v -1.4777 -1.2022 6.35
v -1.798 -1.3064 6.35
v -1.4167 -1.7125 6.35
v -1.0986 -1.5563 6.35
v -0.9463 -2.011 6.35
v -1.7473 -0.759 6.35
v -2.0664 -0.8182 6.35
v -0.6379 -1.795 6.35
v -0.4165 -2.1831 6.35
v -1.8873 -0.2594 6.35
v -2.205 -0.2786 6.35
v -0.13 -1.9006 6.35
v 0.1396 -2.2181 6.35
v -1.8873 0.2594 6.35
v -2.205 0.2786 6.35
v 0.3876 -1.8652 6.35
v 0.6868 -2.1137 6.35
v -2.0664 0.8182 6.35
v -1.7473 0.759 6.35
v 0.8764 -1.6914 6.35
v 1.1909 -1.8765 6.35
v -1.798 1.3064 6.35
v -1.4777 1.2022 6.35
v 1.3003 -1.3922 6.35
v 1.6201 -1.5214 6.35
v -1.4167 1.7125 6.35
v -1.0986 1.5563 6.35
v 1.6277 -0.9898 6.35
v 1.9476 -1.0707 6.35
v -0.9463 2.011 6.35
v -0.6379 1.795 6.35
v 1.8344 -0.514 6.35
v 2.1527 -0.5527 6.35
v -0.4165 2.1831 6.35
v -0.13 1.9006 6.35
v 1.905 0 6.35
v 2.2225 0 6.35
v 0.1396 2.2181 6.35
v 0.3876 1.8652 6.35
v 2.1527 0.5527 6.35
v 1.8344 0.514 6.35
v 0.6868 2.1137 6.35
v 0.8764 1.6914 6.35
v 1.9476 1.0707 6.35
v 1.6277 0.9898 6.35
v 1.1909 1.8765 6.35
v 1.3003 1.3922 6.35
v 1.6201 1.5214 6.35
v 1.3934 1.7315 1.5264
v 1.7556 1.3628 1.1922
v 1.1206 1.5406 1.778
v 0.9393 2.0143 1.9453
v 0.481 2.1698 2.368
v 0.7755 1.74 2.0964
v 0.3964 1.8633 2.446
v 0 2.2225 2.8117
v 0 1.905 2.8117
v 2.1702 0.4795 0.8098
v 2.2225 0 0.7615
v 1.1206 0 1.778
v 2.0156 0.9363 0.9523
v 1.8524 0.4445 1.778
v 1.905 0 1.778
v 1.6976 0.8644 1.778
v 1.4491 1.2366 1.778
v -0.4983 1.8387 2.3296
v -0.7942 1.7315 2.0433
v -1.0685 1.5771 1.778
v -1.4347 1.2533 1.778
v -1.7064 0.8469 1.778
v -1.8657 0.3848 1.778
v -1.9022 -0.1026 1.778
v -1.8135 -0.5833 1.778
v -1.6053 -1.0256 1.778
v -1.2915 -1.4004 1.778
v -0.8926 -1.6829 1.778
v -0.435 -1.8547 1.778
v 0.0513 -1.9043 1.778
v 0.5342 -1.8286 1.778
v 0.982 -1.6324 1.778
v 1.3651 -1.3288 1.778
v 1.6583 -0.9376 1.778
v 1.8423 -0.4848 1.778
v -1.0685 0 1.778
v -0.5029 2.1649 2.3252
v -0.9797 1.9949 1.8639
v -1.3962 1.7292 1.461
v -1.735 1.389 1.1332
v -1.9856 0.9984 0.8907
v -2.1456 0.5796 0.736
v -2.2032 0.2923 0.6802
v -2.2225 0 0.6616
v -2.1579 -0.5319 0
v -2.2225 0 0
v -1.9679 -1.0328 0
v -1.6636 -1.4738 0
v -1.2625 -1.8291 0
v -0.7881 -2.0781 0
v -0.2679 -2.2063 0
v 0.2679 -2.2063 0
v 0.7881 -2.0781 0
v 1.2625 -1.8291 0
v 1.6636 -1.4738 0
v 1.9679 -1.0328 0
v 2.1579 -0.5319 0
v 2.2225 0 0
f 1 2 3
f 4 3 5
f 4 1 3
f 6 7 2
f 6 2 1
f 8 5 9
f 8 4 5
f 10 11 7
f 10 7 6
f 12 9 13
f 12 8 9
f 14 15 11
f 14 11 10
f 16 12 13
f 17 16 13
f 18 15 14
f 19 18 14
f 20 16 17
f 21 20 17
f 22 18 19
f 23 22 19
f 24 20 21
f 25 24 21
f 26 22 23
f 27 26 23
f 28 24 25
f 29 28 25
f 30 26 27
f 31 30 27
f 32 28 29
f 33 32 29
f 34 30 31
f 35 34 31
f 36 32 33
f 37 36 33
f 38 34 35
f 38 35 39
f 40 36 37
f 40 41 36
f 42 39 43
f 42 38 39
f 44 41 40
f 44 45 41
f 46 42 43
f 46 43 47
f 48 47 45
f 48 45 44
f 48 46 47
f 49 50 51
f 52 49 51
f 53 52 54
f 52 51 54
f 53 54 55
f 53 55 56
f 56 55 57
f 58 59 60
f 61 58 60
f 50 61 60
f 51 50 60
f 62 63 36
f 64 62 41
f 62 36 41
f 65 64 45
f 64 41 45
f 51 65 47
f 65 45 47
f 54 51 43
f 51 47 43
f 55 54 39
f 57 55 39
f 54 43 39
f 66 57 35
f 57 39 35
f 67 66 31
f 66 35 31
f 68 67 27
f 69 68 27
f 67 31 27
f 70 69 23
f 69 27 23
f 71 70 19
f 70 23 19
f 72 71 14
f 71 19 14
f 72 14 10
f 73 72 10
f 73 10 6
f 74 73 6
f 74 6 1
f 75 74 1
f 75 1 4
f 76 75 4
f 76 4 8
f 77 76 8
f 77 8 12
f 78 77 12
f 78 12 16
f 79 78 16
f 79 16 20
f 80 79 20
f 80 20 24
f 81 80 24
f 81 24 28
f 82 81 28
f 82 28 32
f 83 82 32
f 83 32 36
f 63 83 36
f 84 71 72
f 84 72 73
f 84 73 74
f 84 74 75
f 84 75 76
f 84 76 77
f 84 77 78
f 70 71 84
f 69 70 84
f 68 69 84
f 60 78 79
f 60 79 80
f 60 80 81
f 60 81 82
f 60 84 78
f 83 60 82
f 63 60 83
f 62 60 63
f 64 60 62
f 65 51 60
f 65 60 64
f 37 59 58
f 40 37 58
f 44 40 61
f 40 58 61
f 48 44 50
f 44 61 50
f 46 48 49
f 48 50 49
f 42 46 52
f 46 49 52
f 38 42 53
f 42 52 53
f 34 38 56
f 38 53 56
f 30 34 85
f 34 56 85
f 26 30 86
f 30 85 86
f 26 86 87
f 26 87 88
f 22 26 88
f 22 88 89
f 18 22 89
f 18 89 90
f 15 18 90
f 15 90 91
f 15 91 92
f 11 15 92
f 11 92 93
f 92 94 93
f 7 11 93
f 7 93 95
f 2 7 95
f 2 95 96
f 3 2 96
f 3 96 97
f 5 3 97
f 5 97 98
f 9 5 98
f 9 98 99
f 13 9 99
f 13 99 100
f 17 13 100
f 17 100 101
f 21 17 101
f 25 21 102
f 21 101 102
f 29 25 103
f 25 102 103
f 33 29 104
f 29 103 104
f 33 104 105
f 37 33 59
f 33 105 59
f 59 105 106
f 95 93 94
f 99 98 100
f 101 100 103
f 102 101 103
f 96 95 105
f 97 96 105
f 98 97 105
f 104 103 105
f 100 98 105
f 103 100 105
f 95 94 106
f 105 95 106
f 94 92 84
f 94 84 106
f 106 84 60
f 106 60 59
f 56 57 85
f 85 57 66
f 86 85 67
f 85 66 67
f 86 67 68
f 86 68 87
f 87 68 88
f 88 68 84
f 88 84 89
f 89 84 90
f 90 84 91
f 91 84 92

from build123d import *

# Parameters (mm, degrees)
F0_R     = 2.2225
F1_DEPTH = 6.35
F2_R     = 1.905
F3_DEPTH = 4.572
F5_DEPTH = 2.2235


with BuildPart() as f1:
    # F0 (on Top) → F1 (new body)
    with BuildSketch(Plane.XY):
        Circle(F0_R)
    extrude(amount=F1_DEPTH)

    # F2 (on face) → F3 (cut)
    with BuildSketch(Plane.XY.offset(6.35)):
        Circle(F2_R)
    extrude(amount=-F3_DEPTH, mode=Mode.SUBTRACT)

    # F4 (on Front) → F5 (cut, through all)
    with BuildSketch(Plane.XZ):
        Polygon((0, 2.811728), (-2.906317, 0), (3.048, 0), align=None)
    extrude(amount=-F5_DEPTH, mode=Mode.SUBTRACT)


solid = f1.part
